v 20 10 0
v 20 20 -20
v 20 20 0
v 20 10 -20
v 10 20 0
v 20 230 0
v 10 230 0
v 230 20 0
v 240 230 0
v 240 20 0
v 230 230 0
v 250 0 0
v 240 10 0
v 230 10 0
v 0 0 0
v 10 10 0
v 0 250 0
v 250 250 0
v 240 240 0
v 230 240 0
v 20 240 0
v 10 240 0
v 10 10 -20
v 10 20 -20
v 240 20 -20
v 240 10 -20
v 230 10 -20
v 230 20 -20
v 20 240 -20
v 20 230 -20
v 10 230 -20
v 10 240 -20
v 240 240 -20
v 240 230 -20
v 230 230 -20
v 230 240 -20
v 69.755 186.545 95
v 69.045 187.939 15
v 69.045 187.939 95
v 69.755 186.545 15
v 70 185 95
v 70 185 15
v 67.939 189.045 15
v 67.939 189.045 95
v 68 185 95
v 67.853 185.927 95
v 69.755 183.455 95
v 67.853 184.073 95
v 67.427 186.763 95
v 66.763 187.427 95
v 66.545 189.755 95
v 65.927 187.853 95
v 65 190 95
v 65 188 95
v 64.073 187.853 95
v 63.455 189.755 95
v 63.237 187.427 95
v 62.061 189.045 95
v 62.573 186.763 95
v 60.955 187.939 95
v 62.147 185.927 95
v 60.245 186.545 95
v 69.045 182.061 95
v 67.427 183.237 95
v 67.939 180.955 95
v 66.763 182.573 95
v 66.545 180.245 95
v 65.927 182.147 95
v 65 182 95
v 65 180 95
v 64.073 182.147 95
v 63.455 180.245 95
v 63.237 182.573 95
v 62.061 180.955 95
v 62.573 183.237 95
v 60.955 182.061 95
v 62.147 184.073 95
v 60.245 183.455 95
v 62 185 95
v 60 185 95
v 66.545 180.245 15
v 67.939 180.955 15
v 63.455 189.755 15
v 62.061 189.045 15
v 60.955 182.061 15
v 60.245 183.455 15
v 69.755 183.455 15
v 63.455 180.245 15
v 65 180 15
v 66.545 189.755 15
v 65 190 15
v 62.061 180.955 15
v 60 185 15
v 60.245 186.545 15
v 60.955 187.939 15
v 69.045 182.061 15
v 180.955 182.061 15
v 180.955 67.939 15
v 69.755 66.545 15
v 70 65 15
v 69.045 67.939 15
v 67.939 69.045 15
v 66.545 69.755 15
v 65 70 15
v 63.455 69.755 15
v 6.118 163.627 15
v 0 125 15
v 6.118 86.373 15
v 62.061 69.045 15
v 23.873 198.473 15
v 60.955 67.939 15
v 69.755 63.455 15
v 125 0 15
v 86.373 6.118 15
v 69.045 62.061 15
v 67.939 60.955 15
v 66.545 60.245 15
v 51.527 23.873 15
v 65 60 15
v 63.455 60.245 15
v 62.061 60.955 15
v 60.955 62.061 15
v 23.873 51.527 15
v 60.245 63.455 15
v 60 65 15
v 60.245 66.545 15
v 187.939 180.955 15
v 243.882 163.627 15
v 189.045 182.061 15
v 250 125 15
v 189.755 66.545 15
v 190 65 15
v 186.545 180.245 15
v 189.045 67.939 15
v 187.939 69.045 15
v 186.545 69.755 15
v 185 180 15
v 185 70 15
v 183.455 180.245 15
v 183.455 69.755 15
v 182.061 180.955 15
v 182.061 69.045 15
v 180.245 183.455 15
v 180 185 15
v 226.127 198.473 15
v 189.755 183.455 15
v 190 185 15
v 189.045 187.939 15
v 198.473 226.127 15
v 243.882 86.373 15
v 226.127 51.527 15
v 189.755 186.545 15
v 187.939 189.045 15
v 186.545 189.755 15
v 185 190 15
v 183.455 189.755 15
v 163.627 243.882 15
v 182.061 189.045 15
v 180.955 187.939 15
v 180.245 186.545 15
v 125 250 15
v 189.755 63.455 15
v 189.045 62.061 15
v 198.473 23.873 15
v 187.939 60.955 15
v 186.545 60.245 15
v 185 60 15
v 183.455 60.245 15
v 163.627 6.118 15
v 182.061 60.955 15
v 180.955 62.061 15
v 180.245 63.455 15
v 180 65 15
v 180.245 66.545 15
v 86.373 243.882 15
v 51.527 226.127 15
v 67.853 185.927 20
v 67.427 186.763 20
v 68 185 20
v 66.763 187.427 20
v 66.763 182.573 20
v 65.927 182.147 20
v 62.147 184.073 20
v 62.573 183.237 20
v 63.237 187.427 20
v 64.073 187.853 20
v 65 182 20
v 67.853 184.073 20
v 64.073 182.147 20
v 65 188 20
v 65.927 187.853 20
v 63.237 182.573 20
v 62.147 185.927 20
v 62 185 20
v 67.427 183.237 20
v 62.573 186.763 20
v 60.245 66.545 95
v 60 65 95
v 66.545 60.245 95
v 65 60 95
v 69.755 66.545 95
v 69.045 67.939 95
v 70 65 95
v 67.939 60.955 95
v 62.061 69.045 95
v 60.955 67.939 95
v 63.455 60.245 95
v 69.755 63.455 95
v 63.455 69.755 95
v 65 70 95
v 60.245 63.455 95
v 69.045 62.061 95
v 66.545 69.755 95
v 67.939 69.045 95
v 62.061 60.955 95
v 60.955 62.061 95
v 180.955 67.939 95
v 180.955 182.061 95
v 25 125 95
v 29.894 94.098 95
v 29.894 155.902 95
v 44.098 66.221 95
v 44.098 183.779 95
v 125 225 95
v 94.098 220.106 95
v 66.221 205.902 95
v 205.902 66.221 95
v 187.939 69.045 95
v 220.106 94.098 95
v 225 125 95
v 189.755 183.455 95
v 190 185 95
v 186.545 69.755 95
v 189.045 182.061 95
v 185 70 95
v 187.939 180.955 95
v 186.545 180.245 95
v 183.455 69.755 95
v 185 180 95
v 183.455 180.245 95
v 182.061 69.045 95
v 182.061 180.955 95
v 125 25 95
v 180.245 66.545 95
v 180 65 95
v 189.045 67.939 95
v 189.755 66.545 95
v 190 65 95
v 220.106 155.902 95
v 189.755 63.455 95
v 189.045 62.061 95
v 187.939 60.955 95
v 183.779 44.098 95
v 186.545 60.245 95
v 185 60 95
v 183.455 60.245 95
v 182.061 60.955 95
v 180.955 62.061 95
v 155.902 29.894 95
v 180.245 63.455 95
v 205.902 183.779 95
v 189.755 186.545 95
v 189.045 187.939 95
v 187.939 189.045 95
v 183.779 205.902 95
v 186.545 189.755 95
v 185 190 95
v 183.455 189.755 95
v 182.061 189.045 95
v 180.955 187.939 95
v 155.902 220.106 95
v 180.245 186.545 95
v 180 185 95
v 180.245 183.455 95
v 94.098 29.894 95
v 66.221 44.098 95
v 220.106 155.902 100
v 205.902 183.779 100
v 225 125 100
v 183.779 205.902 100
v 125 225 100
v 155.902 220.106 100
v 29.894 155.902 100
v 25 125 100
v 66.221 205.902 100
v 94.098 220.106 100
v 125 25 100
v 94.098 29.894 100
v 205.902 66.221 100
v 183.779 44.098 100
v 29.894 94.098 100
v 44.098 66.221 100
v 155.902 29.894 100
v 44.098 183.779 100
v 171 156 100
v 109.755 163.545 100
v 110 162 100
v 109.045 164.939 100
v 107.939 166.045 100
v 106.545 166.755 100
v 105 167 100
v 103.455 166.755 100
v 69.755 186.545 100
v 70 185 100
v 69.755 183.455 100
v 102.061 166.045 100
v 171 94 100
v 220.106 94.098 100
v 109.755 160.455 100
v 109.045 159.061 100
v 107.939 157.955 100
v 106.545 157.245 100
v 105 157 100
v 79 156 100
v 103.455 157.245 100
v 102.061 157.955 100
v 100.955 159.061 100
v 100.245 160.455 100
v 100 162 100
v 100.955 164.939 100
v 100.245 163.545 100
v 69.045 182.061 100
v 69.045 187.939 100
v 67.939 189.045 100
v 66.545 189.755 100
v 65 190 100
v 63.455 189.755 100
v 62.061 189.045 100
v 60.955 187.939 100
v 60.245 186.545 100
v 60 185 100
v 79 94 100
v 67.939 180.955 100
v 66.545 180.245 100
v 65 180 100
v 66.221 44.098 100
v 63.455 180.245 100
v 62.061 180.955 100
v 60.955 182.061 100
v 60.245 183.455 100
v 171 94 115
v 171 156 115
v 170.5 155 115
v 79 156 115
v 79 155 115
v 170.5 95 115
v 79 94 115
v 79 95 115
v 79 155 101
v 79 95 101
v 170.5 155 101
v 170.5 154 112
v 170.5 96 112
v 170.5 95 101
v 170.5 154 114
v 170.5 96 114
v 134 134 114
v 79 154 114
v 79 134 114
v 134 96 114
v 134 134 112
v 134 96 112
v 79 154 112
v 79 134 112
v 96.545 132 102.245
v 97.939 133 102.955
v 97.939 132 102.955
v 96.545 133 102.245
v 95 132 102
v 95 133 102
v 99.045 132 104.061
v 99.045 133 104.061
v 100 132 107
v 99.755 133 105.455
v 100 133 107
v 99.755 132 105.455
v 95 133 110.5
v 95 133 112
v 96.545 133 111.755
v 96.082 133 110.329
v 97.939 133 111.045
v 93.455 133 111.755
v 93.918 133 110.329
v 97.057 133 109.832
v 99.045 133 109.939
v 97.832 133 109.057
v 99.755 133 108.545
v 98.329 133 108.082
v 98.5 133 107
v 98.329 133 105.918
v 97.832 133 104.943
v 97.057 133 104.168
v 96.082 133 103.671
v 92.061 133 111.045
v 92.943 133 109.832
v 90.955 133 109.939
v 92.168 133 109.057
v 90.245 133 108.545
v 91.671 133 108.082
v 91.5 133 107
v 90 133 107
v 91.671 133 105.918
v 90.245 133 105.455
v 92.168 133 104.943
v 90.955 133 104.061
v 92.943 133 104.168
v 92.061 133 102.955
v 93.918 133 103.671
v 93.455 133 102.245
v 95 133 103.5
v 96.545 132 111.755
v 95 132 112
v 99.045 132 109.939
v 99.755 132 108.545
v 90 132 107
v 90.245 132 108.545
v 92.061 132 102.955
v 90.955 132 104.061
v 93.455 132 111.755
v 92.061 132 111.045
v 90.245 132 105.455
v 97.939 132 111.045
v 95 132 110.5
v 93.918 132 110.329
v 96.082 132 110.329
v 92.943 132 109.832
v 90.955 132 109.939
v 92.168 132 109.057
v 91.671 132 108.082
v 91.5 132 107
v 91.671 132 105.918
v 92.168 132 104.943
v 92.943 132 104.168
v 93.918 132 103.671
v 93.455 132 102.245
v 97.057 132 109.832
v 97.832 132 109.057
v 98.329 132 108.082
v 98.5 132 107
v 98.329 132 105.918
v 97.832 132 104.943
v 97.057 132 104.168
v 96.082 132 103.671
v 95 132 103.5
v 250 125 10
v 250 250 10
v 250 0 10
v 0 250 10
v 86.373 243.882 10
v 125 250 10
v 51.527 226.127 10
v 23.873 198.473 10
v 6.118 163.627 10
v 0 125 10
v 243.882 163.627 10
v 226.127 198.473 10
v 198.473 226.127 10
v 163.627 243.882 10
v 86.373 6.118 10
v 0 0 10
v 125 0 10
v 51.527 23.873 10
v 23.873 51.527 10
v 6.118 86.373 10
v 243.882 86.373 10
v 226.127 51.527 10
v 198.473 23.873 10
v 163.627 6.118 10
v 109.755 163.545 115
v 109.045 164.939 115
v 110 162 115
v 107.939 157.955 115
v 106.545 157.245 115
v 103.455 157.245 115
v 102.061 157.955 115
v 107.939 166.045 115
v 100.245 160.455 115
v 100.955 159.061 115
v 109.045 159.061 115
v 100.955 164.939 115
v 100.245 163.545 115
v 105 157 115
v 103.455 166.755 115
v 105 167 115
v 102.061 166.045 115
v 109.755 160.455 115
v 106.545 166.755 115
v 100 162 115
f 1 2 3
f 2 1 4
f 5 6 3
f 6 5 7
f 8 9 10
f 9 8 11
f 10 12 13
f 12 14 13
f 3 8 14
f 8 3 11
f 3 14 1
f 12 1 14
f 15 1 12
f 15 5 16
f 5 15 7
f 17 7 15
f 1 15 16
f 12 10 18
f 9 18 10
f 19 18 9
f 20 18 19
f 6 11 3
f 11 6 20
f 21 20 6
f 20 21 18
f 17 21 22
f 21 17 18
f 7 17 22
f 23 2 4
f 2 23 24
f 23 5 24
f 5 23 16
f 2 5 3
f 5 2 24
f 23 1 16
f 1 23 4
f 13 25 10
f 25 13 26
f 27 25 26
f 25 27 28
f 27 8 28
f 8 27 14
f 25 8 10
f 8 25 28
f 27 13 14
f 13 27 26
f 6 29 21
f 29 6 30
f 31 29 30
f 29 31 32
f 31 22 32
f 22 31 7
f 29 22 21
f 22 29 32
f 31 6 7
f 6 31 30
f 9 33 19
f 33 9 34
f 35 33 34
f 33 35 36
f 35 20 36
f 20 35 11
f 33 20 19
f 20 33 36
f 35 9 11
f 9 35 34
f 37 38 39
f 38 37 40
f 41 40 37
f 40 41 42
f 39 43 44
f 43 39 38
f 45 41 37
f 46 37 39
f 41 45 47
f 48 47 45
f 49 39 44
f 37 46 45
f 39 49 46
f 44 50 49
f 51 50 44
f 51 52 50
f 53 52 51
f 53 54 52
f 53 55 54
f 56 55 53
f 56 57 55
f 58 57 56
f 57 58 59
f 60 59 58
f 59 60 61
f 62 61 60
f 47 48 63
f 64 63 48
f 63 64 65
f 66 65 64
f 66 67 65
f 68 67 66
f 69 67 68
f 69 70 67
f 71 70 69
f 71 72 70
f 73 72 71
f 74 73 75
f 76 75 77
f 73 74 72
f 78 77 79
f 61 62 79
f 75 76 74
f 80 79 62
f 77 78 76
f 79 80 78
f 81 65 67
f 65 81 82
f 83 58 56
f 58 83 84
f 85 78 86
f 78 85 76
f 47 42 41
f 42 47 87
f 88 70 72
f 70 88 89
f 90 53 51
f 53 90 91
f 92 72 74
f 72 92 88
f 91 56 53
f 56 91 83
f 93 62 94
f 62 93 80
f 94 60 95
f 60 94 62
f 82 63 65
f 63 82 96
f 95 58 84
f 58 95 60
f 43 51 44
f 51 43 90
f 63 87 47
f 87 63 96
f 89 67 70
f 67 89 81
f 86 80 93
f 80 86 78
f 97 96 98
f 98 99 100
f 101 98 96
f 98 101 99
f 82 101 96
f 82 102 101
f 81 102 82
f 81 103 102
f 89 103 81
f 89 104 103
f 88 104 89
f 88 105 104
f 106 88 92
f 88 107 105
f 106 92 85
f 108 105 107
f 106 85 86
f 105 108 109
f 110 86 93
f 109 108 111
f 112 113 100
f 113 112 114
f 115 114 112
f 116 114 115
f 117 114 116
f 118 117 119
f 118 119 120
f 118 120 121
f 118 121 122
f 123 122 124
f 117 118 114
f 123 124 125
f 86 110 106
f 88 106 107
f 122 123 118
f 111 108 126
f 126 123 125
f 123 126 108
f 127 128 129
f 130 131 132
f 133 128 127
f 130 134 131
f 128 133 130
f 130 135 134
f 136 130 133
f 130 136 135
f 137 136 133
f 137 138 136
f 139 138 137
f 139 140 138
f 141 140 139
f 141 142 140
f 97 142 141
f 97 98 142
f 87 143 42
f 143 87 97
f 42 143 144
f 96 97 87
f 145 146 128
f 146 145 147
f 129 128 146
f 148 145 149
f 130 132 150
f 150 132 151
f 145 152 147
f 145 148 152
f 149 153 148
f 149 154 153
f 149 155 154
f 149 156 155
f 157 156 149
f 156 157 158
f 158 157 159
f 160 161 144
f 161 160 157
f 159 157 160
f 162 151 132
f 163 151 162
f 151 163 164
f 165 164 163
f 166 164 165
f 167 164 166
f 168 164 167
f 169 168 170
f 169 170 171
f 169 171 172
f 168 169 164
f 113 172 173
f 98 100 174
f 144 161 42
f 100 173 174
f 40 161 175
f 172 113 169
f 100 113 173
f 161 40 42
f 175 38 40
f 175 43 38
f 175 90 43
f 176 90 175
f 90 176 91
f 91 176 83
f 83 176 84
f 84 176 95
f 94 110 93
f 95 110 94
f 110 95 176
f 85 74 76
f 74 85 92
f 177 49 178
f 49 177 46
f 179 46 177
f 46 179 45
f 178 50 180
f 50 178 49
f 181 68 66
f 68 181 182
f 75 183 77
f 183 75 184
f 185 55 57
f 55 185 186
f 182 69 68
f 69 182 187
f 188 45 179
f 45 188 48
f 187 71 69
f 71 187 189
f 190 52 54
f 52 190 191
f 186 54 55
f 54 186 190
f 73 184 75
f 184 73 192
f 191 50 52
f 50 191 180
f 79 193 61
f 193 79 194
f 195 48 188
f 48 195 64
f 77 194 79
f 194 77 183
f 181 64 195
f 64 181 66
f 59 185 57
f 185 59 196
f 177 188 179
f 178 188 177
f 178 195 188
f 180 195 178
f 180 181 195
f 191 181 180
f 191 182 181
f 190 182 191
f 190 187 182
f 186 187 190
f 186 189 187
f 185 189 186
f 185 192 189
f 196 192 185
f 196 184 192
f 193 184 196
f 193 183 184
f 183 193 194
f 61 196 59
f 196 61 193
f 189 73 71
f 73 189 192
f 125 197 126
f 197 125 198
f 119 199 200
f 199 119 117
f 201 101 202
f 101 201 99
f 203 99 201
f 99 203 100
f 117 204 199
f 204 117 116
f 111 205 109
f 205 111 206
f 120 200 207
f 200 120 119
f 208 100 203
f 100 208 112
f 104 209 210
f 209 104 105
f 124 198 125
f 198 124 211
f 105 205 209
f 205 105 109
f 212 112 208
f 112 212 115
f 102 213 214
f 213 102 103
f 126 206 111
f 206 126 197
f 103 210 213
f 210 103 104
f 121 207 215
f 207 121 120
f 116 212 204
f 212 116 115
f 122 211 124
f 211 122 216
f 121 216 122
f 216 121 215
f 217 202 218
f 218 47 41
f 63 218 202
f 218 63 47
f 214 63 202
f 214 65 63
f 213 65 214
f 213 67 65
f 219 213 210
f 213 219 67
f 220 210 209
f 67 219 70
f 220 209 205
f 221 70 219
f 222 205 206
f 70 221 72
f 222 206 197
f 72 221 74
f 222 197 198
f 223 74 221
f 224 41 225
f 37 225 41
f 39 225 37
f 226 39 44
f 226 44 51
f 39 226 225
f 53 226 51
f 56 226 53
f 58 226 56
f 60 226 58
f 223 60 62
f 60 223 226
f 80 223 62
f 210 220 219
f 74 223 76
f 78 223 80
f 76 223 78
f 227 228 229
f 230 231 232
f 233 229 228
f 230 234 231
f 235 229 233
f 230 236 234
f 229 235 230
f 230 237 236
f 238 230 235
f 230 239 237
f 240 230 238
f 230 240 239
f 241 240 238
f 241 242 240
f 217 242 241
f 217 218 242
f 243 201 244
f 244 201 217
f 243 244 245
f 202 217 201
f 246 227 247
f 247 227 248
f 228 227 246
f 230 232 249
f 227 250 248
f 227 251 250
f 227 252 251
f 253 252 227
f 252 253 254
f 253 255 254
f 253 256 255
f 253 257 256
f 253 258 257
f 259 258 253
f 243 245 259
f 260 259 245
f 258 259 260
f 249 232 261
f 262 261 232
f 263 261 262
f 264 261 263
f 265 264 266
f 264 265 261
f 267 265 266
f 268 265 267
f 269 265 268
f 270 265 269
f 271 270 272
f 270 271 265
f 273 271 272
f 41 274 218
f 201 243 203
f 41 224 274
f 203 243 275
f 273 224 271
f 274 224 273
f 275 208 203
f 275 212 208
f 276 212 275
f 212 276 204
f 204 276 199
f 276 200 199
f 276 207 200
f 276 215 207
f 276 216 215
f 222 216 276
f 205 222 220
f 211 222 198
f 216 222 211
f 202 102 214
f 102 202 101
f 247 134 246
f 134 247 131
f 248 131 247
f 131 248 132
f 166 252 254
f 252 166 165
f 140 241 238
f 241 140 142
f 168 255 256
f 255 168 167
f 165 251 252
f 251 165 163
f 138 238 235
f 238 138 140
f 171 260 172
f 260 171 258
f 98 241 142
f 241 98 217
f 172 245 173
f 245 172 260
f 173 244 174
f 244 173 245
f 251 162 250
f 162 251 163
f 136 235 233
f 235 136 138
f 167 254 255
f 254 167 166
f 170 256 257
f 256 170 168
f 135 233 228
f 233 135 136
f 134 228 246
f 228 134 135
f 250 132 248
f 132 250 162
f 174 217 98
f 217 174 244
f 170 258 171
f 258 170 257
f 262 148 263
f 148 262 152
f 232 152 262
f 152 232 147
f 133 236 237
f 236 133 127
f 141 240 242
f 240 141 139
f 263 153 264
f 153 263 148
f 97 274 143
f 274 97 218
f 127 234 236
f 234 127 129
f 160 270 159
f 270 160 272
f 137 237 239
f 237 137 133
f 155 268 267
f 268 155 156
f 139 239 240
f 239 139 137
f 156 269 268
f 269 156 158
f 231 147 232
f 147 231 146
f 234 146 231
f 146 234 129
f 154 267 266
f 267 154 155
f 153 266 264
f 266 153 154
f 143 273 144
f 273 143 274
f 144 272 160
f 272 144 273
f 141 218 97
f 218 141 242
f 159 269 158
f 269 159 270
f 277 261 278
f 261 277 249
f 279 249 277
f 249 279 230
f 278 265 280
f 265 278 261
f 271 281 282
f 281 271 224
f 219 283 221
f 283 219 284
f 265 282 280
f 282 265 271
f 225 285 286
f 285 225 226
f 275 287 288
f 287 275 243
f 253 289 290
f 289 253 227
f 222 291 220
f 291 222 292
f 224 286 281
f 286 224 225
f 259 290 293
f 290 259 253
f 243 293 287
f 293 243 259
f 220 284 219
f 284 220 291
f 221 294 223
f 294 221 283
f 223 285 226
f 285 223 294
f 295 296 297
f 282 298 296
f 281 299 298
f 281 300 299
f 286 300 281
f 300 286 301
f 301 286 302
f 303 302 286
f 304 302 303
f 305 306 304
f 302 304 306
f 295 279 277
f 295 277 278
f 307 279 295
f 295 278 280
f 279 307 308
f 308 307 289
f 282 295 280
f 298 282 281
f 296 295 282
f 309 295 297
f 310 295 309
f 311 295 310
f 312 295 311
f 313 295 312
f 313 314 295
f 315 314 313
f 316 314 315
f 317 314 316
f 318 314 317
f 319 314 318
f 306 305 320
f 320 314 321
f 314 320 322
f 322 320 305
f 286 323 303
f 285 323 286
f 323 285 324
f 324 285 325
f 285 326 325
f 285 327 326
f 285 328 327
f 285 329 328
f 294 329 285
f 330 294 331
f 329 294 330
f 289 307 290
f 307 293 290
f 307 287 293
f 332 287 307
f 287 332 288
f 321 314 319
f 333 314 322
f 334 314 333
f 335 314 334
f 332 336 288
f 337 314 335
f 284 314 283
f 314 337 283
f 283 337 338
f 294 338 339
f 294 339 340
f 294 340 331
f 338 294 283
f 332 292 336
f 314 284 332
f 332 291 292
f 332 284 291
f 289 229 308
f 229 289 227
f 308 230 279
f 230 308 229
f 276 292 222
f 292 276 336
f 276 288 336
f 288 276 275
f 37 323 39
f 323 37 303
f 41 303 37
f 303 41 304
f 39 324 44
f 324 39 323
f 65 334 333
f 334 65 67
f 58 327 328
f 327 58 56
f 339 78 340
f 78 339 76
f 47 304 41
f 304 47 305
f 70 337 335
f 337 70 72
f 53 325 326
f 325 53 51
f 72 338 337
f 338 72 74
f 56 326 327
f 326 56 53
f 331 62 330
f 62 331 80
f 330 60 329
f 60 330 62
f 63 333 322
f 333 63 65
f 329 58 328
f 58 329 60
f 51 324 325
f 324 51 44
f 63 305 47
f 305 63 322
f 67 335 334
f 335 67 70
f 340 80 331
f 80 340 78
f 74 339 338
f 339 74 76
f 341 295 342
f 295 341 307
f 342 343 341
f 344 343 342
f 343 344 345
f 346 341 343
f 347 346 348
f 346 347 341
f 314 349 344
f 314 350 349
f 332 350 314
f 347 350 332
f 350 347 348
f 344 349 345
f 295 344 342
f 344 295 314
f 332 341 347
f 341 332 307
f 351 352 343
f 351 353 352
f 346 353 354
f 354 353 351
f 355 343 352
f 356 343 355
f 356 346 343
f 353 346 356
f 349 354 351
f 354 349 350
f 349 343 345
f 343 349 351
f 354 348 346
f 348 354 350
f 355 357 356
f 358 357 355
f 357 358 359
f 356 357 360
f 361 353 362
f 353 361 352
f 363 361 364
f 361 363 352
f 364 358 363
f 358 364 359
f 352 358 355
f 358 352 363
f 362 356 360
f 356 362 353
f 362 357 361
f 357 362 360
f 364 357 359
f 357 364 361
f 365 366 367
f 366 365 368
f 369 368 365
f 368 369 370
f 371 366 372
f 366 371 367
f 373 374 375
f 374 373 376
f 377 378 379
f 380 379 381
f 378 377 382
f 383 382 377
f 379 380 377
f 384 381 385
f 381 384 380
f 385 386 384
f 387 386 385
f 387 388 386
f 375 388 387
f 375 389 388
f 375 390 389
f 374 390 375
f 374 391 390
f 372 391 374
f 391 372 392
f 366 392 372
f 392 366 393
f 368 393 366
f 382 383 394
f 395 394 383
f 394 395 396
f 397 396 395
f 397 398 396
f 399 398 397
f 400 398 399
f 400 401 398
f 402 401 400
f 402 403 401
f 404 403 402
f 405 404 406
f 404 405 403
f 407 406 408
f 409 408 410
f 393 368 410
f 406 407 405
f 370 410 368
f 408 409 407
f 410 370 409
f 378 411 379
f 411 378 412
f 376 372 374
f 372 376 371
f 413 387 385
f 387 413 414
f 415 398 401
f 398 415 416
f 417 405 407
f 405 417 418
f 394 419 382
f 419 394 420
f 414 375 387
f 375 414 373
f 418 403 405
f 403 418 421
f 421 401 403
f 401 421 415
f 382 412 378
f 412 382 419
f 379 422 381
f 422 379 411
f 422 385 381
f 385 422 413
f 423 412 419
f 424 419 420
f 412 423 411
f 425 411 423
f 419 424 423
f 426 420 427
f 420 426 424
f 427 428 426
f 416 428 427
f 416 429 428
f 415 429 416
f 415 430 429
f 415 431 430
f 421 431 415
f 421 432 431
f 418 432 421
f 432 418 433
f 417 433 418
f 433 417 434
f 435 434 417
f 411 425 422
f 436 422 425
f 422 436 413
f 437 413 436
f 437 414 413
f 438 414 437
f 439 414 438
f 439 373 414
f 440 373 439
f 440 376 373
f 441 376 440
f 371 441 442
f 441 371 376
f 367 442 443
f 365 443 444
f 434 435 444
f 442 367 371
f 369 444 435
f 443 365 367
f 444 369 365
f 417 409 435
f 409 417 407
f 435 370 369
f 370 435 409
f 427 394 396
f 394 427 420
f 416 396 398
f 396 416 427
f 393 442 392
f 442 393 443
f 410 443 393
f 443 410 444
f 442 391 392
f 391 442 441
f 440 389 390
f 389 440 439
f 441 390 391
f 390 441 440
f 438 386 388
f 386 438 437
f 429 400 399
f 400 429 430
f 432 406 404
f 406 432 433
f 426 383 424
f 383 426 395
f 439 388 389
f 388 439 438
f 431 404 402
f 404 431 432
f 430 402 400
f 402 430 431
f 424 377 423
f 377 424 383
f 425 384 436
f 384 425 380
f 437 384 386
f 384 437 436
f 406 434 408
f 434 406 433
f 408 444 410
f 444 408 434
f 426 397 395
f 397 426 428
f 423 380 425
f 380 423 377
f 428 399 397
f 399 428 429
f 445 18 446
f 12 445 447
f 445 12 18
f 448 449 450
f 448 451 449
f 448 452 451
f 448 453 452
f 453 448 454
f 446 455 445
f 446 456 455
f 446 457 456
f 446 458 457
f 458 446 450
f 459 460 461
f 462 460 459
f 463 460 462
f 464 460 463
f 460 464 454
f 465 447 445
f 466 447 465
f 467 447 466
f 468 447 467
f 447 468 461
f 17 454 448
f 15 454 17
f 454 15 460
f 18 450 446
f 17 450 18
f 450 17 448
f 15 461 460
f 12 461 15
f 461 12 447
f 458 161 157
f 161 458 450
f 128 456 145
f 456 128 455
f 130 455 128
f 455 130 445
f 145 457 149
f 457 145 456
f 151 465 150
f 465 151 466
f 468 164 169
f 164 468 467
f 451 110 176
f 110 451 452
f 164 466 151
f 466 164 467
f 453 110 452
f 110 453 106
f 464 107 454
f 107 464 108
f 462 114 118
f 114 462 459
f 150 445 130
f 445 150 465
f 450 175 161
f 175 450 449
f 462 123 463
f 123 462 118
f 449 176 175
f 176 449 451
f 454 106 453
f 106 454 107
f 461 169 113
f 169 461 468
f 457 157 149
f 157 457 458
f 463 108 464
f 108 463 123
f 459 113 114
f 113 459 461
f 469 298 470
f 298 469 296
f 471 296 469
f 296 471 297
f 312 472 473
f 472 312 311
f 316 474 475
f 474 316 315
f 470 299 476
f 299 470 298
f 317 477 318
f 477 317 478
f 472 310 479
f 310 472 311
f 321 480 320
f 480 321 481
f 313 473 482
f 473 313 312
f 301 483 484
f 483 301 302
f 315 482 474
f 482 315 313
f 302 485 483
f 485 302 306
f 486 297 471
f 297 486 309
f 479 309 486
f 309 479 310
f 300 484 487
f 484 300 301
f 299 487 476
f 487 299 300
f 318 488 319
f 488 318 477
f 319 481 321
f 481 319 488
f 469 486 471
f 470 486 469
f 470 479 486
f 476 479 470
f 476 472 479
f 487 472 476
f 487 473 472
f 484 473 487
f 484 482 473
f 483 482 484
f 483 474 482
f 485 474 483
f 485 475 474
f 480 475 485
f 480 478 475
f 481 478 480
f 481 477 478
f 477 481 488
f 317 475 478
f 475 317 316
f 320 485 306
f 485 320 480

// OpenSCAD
$fn = 20;

// Patas parte inferior
alturaPatas = 20;
color("Black"){
    translate([10, 10, -20])
    cube([10, 10, 20]);
    translate([230, 10, -20])
    cube([10, 10, 20]);
    translate([10, 230, -20])
    cube([10, 10, 20]);
    translate([230, 230, -20])
    cube([10, 10, 20]);
}

// Base cuadrada parte inferior
alturaBaseCuadrada = 10;
dimBaseCuadrada = 250;
color("Green"){
    cube([dimBaseCuadrada, dimBaseCuadrada, alturaBaseCuadrada]);
}


// Base turquesa
alturaBaseTurquesa = 5;
dimBaseTurquesa = 250;
color("DarkTurquoise"){
    translate([dimBaseTurquesa / 2, dimBaseTurquesa / 2, alturaBaseCuadrada])
    cylinder(h = alturaBaseTurquesa, d = dimBaseTurquesa);
}


// Cilindros base turquesa -> base verde
alturaCilindros = 80;
grosorCilindros = 10;
translate([dimBaseTurquesa / 2, dimBaseTurquesa / 2, alturaBaseCuadrada + alturaBaseTurquesa])
color("White"){
    translate([-60, -60, 0])
    cylinder(h = alturaCilindros, d = grosorCilindros);
    difference() {
        translate([-60, 60, 0])
        cylinder(h = alturaCilindros, d = grosorCilindros);
        translate([-60, 60, 5])
        cylinder(h = alturaCilindros - 4, d = grosorCilindros - 4);
    }
    translate([60, -60, 0])
    cylinder(h = alturaCilindros, d = grosorCilindros);
    translate([60, 60, 0])
    cylinder(h = alturaCilindros, d = grosorCilindros);
}

// Base verde superior
// Se incluye corte para mostrar hueco taladrado para pasar cables
translate([dimBaseTurquesa / 2, dimBaseTurquesa / 2, alturaBaseCuadrada + alturaBaseTurquesa + alturaCilindros])
color("Green"){
    difference() {
        cylinder(h = alturaBaseTurquesa, d = 200);
        translate([-60, 60, -1])
        color("Red")
        cylinder(h = 20, d = grosorCilindros);
    }
}

// Caja de cartas
alturaCaja = 20;
translate([dimBaseTurquesa / 2, dimBaseTurquesa / 2, alturaBaseCuadrada + alturaBaseTurquesa + alturaCilindros + alturaCaja / 2])
color("DarkTurquoise")
difference(){
    cube([92, 62, alturaCaja], center = true);
    translate([-2, 0, alturaBaseTurquesa + 1])
    cube([95, 60, alturaCaja], center = true);
}

// Tubos para levantar motor
translate([dimBaseTurquesa / 2, dimBaseTurquesa / 2, alturaBaseCuadrada + alturaBaseTurquesa + alturaCilindros])
color("White"){
    translate([-20, 37, 0])
    cylinder(h = alturaCaja, d = grosorCilindros);
}

// Tapa superior
translate([dimBaseTurquesa / 2, dimBaseTurquesa / 2, alturaBaseCuadrada + alturaBaseTurquesa + alturaCilindros + alturaCaja - 2])
difference(){
    color("Gold")
    cube([92, 58, 2], center = true);
    translate([-46, -29, -1])
    color("White")
    cube([55, 38, 4]);
}

// Goma giratoria
translate([dimBaseTurquesa / 2, dimBaseTurquesa / 2, alturaBaseCuadrada + alturaBaseTurquesa + alturaCilindros + alturaCaja / 2 + 2])
translate([-30, 8, 0])
rotate([90, 90, 0])
color("Black")
difference(){
    cylinder(h = 1, d = alturaCaja / 2);
    cylinder(h = 1, d = alturaCaja / 2 - 3);
}
